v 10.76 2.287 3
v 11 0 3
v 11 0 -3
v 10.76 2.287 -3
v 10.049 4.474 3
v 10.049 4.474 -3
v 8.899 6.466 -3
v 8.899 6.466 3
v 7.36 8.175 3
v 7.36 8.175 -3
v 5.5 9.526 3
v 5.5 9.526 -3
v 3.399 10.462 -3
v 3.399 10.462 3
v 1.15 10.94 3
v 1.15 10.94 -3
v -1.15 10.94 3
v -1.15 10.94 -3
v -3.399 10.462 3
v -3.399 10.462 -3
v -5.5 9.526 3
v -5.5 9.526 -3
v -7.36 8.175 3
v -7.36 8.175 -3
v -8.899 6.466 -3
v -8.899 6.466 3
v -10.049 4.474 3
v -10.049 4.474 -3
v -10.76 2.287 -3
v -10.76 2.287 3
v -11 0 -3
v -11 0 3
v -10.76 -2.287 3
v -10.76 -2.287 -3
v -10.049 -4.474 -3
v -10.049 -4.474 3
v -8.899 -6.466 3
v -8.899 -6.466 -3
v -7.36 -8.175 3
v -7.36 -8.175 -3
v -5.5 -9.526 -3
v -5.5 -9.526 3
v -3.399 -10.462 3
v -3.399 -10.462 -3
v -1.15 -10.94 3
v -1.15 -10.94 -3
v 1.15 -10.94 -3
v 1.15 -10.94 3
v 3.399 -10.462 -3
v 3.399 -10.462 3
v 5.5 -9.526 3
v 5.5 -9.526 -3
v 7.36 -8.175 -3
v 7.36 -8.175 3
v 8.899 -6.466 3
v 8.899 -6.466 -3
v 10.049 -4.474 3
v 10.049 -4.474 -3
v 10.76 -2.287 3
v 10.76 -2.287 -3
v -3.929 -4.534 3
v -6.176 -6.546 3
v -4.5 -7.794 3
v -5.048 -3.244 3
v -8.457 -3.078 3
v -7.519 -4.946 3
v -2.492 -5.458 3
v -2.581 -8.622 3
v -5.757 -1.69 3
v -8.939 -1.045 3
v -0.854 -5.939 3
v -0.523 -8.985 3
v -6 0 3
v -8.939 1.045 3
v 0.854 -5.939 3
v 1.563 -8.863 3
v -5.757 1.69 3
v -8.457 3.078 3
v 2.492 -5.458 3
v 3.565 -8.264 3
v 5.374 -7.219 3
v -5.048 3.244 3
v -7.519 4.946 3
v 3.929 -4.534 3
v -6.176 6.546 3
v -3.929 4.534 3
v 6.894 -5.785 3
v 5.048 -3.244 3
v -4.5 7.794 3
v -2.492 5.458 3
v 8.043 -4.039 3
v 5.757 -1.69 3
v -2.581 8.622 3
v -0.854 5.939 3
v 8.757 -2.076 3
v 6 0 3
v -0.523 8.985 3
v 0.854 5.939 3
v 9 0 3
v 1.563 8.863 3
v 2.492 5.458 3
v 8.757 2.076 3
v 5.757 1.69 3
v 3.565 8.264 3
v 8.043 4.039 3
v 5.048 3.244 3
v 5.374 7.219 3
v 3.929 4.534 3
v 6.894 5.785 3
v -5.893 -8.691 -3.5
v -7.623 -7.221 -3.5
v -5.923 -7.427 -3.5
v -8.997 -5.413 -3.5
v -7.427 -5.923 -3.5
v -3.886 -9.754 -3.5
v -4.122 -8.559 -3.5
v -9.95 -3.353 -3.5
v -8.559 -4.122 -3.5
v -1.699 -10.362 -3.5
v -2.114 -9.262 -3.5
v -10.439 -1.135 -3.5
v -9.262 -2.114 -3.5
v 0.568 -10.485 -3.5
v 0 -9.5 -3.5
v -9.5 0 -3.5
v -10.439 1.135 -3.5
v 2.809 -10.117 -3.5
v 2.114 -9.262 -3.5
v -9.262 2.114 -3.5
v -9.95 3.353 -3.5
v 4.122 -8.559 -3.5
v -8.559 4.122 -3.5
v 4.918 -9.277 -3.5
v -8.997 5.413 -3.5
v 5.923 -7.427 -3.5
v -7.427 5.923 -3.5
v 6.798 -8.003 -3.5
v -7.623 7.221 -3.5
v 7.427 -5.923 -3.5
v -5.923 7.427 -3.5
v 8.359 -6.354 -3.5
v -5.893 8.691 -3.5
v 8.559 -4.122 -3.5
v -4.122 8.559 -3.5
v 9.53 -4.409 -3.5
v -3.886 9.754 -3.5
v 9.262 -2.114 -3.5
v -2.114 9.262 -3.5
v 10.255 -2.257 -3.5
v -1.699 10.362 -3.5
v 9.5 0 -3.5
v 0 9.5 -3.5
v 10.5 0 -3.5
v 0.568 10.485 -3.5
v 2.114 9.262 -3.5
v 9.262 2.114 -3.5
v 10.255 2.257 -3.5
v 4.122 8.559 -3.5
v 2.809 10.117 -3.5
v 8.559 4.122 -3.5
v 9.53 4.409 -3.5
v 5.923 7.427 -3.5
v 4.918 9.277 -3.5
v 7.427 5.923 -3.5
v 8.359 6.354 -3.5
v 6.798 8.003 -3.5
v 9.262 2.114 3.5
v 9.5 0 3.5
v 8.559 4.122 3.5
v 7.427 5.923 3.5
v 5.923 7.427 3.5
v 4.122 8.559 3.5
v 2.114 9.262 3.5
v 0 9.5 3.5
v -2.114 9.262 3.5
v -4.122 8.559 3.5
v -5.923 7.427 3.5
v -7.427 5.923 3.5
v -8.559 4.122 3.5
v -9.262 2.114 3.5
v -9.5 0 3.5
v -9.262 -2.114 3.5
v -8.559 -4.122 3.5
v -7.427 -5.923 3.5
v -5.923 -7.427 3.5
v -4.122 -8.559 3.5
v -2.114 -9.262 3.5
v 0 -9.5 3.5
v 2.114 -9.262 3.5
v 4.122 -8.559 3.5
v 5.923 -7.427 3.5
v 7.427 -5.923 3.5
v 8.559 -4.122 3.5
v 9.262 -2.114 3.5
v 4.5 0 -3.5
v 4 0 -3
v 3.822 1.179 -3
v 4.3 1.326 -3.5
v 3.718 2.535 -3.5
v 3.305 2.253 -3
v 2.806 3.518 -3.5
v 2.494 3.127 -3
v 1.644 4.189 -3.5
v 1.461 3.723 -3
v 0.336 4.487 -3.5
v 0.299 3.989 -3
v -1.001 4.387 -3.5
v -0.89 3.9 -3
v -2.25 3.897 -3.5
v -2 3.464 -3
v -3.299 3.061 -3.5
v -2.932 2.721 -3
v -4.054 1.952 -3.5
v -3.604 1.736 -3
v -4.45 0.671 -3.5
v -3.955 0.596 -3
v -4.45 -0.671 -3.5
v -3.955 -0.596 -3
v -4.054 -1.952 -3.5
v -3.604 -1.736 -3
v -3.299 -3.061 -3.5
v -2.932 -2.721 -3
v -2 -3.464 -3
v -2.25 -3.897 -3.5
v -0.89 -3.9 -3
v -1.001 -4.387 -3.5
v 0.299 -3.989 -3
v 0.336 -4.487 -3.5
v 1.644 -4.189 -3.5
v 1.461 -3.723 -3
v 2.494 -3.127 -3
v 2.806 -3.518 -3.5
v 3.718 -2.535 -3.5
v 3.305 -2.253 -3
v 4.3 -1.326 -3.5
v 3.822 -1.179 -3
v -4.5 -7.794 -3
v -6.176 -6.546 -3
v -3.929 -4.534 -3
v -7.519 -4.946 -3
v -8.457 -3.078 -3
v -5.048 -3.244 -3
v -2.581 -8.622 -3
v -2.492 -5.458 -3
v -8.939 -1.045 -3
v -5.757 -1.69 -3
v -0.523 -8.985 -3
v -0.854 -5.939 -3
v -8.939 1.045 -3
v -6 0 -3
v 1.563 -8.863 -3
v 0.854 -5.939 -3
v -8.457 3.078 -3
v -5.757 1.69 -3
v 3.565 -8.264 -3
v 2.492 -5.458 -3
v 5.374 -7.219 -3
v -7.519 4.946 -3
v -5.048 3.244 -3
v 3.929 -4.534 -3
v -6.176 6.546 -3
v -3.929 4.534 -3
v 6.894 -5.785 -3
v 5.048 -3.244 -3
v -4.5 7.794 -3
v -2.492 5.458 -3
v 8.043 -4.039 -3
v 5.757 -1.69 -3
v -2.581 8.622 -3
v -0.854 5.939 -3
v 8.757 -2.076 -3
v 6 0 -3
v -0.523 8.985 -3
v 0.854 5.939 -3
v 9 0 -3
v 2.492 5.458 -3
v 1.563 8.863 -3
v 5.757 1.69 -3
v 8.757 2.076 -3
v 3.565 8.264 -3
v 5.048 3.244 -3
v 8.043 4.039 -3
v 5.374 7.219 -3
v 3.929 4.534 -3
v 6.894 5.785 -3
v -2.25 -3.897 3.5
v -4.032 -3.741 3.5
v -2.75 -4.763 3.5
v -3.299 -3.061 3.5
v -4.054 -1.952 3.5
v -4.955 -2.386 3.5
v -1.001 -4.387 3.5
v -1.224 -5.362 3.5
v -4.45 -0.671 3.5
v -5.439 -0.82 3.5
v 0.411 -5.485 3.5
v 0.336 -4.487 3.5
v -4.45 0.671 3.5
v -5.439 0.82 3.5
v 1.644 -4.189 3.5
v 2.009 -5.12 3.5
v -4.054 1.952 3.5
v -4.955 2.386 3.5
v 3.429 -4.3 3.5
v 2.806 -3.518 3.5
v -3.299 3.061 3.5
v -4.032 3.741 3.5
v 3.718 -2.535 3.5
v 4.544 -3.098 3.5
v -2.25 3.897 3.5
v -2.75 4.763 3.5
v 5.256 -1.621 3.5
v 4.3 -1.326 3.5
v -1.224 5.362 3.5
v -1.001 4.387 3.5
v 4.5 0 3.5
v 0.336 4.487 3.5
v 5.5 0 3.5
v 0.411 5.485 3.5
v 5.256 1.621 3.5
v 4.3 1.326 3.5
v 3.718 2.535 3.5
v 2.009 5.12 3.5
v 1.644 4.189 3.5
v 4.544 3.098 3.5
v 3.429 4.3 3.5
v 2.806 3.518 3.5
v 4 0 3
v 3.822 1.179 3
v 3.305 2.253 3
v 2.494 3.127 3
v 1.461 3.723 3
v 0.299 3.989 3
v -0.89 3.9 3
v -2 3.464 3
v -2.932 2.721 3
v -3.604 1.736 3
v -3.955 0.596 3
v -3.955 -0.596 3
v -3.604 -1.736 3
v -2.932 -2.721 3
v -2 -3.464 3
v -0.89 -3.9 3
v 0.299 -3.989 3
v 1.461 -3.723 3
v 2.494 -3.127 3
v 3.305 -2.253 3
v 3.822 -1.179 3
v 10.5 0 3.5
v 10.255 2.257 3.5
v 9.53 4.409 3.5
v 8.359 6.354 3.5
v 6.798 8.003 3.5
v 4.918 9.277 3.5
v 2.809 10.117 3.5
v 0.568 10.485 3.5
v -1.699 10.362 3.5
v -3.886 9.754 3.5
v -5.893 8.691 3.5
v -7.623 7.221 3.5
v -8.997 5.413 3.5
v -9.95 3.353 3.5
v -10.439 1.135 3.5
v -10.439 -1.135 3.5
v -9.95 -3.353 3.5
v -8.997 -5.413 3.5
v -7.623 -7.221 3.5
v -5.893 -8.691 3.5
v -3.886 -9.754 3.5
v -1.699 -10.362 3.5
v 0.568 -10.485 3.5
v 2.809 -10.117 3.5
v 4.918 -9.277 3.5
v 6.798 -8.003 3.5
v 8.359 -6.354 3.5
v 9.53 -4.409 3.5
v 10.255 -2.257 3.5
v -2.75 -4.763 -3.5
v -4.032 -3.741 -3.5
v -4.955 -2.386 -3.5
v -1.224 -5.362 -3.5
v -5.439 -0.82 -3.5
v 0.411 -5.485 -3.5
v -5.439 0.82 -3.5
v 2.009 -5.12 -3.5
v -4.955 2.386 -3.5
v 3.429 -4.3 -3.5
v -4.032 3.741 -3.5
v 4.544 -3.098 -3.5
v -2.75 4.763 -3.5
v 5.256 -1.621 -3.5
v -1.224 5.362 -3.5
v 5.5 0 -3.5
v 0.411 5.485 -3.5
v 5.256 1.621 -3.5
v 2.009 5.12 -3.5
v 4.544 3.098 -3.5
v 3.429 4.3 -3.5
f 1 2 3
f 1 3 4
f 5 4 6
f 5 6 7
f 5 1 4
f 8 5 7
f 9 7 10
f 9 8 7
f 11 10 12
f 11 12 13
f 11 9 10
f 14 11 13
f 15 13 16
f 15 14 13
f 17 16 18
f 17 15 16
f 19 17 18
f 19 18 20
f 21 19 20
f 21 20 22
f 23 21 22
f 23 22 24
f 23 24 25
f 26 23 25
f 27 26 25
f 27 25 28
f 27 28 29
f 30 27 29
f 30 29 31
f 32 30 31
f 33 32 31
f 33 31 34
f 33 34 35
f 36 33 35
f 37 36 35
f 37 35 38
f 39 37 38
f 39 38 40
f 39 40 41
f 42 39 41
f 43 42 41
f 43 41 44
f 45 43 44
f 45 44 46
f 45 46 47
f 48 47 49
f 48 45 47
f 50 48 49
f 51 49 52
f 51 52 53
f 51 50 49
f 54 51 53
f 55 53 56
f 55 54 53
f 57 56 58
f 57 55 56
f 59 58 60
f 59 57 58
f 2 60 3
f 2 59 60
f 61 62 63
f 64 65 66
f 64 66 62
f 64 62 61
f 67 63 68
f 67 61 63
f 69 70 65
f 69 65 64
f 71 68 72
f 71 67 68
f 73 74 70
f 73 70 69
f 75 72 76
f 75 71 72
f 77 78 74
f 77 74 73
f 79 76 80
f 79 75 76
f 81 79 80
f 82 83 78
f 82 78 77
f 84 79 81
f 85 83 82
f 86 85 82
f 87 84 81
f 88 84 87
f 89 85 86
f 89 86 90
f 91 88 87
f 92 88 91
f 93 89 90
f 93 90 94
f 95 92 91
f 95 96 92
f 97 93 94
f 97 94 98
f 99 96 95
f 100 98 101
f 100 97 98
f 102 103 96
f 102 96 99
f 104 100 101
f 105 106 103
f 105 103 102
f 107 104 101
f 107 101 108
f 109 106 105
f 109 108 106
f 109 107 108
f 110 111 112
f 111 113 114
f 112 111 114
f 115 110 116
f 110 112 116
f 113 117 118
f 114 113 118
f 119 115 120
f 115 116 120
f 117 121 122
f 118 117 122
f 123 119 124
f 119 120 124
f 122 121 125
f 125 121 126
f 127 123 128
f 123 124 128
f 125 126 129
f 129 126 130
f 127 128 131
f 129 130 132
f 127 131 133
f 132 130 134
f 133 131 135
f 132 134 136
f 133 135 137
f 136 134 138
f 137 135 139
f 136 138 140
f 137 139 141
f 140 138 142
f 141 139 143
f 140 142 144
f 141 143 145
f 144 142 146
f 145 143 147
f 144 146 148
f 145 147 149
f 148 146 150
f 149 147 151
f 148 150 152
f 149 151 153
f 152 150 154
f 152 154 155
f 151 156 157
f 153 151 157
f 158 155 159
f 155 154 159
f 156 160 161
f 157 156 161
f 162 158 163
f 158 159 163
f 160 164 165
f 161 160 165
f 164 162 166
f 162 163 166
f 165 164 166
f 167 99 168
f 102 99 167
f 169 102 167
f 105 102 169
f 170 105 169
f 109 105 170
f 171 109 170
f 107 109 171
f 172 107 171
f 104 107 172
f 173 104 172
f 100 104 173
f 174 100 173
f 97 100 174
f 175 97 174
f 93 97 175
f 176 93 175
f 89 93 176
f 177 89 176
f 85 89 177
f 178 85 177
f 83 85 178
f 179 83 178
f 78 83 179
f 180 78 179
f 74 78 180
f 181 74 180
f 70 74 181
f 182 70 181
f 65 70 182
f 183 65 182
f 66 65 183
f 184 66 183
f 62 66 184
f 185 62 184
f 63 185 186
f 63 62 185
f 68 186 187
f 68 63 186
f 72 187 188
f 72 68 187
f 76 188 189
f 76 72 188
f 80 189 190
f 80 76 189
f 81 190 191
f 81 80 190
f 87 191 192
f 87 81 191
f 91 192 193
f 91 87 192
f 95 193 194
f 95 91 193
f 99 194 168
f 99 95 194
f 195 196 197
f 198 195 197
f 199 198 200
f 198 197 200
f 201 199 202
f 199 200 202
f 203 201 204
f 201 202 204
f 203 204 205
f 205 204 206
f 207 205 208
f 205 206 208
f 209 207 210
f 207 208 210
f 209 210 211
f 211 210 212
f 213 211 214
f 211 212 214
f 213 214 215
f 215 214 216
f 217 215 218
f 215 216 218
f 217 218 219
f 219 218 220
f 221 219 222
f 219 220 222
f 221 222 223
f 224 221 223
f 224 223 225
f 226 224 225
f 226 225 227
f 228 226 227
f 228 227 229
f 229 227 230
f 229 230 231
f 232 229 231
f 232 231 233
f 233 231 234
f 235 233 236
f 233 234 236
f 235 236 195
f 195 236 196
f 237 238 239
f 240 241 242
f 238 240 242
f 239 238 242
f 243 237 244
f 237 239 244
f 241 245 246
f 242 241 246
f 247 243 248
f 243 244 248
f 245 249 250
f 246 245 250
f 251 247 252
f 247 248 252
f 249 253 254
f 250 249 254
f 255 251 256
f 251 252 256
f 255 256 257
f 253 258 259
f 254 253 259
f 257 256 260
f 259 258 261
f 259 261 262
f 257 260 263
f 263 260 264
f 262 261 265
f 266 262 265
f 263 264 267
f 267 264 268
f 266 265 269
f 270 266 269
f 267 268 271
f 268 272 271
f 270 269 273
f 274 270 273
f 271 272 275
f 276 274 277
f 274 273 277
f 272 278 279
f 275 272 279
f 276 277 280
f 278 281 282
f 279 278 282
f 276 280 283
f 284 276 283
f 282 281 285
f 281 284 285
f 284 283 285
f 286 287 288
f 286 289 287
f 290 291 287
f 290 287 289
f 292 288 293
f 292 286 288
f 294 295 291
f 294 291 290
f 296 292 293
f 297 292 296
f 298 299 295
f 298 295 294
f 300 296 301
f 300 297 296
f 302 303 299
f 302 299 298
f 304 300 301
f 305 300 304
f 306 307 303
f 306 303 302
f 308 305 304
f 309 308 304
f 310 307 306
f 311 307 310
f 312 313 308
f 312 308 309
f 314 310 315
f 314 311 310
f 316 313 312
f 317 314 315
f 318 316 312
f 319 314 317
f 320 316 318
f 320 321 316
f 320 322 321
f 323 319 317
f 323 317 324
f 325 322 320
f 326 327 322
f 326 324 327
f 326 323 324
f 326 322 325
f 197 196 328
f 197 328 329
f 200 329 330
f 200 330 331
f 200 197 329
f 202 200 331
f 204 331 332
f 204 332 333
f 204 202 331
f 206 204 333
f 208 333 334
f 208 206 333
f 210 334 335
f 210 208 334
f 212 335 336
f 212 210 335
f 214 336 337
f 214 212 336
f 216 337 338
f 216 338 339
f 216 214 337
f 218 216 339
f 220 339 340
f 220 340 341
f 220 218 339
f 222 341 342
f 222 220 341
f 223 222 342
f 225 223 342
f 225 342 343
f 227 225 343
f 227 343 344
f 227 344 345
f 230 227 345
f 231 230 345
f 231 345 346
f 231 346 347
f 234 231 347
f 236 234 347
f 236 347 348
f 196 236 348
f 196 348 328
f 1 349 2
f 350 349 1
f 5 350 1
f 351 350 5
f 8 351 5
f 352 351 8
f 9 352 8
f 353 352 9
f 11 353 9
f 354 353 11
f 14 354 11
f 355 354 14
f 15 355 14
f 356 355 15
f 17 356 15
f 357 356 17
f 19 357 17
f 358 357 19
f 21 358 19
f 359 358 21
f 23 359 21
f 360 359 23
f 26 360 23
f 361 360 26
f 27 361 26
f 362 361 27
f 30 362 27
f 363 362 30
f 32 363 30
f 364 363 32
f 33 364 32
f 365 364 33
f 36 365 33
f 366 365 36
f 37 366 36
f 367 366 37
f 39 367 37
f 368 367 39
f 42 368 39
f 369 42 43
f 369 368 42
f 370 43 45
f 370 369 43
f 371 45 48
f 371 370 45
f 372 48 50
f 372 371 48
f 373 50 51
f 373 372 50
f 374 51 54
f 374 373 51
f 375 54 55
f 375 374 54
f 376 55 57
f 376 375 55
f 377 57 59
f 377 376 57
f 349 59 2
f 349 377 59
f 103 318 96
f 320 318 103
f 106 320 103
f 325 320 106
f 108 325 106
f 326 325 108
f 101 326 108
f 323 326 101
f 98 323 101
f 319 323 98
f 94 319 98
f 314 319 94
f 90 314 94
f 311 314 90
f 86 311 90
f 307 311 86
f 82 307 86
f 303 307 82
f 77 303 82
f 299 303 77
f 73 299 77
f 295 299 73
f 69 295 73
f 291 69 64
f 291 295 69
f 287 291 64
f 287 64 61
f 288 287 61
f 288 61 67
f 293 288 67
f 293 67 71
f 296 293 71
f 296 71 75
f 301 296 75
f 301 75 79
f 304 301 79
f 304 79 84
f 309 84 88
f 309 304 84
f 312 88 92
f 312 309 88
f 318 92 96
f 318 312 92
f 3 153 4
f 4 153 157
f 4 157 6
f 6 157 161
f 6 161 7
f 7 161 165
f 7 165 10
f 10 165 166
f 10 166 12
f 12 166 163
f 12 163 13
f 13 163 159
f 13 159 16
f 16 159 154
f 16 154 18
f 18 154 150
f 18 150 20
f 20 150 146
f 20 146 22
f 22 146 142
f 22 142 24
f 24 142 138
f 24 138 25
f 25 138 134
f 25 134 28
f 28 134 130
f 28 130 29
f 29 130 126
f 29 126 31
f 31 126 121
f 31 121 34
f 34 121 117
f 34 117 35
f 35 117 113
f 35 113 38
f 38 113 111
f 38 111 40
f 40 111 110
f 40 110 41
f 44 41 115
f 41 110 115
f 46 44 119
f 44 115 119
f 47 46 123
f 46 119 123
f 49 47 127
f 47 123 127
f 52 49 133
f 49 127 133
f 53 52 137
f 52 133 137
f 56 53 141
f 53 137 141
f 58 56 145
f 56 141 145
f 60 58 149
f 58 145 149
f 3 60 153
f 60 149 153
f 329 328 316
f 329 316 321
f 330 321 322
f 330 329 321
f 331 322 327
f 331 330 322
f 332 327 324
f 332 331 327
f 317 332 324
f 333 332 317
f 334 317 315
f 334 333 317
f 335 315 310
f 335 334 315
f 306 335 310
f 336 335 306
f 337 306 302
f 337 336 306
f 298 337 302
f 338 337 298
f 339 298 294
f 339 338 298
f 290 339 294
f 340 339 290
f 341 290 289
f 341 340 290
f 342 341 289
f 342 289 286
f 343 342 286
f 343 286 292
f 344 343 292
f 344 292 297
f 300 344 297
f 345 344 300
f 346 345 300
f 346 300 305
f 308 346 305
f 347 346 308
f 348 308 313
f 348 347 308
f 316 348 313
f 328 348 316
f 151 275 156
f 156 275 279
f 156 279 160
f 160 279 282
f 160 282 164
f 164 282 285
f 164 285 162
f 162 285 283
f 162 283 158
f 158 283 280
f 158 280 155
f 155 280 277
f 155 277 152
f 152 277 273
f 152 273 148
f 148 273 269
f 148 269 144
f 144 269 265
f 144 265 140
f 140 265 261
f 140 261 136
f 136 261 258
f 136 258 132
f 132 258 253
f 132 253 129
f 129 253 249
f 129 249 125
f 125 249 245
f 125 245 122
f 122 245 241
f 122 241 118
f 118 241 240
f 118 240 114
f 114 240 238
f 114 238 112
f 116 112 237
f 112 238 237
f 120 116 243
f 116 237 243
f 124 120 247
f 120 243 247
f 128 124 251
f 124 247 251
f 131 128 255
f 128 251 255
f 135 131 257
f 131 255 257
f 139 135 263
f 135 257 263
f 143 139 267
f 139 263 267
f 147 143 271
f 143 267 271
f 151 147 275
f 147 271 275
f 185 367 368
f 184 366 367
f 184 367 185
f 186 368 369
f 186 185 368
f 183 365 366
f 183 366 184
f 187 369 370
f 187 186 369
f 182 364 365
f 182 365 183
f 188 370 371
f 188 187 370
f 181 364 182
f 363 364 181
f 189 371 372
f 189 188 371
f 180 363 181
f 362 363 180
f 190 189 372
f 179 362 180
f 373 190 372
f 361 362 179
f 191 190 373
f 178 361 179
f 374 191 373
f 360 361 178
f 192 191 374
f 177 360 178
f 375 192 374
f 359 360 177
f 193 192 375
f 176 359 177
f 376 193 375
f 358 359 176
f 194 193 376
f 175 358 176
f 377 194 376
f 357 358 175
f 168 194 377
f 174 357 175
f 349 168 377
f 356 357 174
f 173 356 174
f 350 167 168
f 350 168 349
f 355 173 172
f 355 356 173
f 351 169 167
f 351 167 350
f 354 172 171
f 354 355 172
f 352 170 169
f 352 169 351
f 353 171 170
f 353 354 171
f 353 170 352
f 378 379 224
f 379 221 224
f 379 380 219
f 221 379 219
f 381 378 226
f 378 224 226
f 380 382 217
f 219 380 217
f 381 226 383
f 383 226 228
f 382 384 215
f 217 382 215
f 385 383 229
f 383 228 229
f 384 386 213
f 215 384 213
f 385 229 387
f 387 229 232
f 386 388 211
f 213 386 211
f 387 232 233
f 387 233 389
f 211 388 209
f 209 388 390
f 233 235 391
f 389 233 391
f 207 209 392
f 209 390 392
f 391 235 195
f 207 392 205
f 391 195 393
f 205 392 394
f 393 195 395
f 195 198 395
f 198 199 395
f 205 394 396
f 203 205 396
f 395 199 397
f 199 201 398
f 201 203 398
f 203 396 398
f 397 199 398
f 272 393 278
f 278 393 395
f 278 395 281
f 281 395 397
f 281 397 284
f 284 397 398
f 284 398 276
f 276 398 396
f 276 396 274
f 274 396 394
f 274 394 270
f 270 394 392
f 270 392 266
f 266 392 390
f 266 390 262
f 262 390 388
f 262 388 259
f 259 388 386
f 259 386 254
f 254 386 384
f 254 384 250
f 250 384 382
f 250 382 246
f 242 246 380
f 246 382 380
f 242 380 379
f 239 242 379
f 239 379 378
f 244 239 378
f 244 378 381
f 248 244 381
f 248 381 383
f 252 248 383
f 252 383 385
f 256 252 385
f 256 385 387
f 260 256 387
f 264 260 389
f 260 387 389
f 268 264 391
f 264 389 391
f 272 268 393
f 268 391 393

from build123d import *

# Parameters (mm, degrees)
SKETCH1_R           = 11
SKETCH1_R_2         = 4
BOSS_EXTRUDE1_DEPTH = 3.5
CUT_EXTRUDE1_START  = -3.5
SKETCH1_3_R         = 9
SKETCH1_3_R_2       = 6
CUT_EXTRUDE1_DEPTH  = 0.5
CUT_EXTRUDE2_START  = 3
SKETCH1_4_R         = 9
SKETCH1_4_R_2       = 6
CUT_EXTRUDE2_DEPTH  = 0.5
CHAMFER1_SIZE       = 0.5


with BuildPart() as part:
    # Sketch1 → Boss-Extrude1 (new, symmetric)
    with BuildSketch(Plane.XY):
        Circle(SKETCH1_R)
        Circle(SKETCH1_R_2, mode=Mode.SUBTRACT)
    extrude(amount=BOSS_EXTRUDE1_DEPTH, both=True)

    # Sketch1<3> → Cut-Extrude1 (cut)
    with BuildSketch(Plane.XY.offset(CUT_EXTRUDE1_START)):
        Circle(SKETCH1_3_R)
        Circle(SKETCH1_3_R_2, mode=Mode.SUBTRACT)
    extrude(amount=CUT_EXTRUDE1_DEPTH, mode=Mode.SUBTRACT)

    # Sketch1<4> → Cut-Extrude2 (cut)
    with BuildSketch(Plane.XY.offset(CUT_EXTRUDE2_START)):
        Circle(SKETCH1_4_R)
        Circle(SKETCH1_4_R_2, mode=Mode.SUBTRACT)
    extrude(amount=CUT_EXTRUDE2_DEPTH, mode=Mode.SUBTRACT)

    # Chamfer1
    chamfer1_edges = [part.edges().sort_by_distance(p)[0] for p in [
        (-6, 0, -3.5),
        (-9, 0, -3.5),
        (-11, 0, -3.5),
        (-9, 0, 3.5),
        (-6, 0, 3.5),
        (-11, 0, 3.5),
        (-4, 0, -3.5),
        (-4, 0, 3.5),
    ]]
    chamfer(chamfer1_edges, length=CHAMFER1_SIZE - 0.0001)  # a hair under: the kernel refuses the full size


solid = part.part
